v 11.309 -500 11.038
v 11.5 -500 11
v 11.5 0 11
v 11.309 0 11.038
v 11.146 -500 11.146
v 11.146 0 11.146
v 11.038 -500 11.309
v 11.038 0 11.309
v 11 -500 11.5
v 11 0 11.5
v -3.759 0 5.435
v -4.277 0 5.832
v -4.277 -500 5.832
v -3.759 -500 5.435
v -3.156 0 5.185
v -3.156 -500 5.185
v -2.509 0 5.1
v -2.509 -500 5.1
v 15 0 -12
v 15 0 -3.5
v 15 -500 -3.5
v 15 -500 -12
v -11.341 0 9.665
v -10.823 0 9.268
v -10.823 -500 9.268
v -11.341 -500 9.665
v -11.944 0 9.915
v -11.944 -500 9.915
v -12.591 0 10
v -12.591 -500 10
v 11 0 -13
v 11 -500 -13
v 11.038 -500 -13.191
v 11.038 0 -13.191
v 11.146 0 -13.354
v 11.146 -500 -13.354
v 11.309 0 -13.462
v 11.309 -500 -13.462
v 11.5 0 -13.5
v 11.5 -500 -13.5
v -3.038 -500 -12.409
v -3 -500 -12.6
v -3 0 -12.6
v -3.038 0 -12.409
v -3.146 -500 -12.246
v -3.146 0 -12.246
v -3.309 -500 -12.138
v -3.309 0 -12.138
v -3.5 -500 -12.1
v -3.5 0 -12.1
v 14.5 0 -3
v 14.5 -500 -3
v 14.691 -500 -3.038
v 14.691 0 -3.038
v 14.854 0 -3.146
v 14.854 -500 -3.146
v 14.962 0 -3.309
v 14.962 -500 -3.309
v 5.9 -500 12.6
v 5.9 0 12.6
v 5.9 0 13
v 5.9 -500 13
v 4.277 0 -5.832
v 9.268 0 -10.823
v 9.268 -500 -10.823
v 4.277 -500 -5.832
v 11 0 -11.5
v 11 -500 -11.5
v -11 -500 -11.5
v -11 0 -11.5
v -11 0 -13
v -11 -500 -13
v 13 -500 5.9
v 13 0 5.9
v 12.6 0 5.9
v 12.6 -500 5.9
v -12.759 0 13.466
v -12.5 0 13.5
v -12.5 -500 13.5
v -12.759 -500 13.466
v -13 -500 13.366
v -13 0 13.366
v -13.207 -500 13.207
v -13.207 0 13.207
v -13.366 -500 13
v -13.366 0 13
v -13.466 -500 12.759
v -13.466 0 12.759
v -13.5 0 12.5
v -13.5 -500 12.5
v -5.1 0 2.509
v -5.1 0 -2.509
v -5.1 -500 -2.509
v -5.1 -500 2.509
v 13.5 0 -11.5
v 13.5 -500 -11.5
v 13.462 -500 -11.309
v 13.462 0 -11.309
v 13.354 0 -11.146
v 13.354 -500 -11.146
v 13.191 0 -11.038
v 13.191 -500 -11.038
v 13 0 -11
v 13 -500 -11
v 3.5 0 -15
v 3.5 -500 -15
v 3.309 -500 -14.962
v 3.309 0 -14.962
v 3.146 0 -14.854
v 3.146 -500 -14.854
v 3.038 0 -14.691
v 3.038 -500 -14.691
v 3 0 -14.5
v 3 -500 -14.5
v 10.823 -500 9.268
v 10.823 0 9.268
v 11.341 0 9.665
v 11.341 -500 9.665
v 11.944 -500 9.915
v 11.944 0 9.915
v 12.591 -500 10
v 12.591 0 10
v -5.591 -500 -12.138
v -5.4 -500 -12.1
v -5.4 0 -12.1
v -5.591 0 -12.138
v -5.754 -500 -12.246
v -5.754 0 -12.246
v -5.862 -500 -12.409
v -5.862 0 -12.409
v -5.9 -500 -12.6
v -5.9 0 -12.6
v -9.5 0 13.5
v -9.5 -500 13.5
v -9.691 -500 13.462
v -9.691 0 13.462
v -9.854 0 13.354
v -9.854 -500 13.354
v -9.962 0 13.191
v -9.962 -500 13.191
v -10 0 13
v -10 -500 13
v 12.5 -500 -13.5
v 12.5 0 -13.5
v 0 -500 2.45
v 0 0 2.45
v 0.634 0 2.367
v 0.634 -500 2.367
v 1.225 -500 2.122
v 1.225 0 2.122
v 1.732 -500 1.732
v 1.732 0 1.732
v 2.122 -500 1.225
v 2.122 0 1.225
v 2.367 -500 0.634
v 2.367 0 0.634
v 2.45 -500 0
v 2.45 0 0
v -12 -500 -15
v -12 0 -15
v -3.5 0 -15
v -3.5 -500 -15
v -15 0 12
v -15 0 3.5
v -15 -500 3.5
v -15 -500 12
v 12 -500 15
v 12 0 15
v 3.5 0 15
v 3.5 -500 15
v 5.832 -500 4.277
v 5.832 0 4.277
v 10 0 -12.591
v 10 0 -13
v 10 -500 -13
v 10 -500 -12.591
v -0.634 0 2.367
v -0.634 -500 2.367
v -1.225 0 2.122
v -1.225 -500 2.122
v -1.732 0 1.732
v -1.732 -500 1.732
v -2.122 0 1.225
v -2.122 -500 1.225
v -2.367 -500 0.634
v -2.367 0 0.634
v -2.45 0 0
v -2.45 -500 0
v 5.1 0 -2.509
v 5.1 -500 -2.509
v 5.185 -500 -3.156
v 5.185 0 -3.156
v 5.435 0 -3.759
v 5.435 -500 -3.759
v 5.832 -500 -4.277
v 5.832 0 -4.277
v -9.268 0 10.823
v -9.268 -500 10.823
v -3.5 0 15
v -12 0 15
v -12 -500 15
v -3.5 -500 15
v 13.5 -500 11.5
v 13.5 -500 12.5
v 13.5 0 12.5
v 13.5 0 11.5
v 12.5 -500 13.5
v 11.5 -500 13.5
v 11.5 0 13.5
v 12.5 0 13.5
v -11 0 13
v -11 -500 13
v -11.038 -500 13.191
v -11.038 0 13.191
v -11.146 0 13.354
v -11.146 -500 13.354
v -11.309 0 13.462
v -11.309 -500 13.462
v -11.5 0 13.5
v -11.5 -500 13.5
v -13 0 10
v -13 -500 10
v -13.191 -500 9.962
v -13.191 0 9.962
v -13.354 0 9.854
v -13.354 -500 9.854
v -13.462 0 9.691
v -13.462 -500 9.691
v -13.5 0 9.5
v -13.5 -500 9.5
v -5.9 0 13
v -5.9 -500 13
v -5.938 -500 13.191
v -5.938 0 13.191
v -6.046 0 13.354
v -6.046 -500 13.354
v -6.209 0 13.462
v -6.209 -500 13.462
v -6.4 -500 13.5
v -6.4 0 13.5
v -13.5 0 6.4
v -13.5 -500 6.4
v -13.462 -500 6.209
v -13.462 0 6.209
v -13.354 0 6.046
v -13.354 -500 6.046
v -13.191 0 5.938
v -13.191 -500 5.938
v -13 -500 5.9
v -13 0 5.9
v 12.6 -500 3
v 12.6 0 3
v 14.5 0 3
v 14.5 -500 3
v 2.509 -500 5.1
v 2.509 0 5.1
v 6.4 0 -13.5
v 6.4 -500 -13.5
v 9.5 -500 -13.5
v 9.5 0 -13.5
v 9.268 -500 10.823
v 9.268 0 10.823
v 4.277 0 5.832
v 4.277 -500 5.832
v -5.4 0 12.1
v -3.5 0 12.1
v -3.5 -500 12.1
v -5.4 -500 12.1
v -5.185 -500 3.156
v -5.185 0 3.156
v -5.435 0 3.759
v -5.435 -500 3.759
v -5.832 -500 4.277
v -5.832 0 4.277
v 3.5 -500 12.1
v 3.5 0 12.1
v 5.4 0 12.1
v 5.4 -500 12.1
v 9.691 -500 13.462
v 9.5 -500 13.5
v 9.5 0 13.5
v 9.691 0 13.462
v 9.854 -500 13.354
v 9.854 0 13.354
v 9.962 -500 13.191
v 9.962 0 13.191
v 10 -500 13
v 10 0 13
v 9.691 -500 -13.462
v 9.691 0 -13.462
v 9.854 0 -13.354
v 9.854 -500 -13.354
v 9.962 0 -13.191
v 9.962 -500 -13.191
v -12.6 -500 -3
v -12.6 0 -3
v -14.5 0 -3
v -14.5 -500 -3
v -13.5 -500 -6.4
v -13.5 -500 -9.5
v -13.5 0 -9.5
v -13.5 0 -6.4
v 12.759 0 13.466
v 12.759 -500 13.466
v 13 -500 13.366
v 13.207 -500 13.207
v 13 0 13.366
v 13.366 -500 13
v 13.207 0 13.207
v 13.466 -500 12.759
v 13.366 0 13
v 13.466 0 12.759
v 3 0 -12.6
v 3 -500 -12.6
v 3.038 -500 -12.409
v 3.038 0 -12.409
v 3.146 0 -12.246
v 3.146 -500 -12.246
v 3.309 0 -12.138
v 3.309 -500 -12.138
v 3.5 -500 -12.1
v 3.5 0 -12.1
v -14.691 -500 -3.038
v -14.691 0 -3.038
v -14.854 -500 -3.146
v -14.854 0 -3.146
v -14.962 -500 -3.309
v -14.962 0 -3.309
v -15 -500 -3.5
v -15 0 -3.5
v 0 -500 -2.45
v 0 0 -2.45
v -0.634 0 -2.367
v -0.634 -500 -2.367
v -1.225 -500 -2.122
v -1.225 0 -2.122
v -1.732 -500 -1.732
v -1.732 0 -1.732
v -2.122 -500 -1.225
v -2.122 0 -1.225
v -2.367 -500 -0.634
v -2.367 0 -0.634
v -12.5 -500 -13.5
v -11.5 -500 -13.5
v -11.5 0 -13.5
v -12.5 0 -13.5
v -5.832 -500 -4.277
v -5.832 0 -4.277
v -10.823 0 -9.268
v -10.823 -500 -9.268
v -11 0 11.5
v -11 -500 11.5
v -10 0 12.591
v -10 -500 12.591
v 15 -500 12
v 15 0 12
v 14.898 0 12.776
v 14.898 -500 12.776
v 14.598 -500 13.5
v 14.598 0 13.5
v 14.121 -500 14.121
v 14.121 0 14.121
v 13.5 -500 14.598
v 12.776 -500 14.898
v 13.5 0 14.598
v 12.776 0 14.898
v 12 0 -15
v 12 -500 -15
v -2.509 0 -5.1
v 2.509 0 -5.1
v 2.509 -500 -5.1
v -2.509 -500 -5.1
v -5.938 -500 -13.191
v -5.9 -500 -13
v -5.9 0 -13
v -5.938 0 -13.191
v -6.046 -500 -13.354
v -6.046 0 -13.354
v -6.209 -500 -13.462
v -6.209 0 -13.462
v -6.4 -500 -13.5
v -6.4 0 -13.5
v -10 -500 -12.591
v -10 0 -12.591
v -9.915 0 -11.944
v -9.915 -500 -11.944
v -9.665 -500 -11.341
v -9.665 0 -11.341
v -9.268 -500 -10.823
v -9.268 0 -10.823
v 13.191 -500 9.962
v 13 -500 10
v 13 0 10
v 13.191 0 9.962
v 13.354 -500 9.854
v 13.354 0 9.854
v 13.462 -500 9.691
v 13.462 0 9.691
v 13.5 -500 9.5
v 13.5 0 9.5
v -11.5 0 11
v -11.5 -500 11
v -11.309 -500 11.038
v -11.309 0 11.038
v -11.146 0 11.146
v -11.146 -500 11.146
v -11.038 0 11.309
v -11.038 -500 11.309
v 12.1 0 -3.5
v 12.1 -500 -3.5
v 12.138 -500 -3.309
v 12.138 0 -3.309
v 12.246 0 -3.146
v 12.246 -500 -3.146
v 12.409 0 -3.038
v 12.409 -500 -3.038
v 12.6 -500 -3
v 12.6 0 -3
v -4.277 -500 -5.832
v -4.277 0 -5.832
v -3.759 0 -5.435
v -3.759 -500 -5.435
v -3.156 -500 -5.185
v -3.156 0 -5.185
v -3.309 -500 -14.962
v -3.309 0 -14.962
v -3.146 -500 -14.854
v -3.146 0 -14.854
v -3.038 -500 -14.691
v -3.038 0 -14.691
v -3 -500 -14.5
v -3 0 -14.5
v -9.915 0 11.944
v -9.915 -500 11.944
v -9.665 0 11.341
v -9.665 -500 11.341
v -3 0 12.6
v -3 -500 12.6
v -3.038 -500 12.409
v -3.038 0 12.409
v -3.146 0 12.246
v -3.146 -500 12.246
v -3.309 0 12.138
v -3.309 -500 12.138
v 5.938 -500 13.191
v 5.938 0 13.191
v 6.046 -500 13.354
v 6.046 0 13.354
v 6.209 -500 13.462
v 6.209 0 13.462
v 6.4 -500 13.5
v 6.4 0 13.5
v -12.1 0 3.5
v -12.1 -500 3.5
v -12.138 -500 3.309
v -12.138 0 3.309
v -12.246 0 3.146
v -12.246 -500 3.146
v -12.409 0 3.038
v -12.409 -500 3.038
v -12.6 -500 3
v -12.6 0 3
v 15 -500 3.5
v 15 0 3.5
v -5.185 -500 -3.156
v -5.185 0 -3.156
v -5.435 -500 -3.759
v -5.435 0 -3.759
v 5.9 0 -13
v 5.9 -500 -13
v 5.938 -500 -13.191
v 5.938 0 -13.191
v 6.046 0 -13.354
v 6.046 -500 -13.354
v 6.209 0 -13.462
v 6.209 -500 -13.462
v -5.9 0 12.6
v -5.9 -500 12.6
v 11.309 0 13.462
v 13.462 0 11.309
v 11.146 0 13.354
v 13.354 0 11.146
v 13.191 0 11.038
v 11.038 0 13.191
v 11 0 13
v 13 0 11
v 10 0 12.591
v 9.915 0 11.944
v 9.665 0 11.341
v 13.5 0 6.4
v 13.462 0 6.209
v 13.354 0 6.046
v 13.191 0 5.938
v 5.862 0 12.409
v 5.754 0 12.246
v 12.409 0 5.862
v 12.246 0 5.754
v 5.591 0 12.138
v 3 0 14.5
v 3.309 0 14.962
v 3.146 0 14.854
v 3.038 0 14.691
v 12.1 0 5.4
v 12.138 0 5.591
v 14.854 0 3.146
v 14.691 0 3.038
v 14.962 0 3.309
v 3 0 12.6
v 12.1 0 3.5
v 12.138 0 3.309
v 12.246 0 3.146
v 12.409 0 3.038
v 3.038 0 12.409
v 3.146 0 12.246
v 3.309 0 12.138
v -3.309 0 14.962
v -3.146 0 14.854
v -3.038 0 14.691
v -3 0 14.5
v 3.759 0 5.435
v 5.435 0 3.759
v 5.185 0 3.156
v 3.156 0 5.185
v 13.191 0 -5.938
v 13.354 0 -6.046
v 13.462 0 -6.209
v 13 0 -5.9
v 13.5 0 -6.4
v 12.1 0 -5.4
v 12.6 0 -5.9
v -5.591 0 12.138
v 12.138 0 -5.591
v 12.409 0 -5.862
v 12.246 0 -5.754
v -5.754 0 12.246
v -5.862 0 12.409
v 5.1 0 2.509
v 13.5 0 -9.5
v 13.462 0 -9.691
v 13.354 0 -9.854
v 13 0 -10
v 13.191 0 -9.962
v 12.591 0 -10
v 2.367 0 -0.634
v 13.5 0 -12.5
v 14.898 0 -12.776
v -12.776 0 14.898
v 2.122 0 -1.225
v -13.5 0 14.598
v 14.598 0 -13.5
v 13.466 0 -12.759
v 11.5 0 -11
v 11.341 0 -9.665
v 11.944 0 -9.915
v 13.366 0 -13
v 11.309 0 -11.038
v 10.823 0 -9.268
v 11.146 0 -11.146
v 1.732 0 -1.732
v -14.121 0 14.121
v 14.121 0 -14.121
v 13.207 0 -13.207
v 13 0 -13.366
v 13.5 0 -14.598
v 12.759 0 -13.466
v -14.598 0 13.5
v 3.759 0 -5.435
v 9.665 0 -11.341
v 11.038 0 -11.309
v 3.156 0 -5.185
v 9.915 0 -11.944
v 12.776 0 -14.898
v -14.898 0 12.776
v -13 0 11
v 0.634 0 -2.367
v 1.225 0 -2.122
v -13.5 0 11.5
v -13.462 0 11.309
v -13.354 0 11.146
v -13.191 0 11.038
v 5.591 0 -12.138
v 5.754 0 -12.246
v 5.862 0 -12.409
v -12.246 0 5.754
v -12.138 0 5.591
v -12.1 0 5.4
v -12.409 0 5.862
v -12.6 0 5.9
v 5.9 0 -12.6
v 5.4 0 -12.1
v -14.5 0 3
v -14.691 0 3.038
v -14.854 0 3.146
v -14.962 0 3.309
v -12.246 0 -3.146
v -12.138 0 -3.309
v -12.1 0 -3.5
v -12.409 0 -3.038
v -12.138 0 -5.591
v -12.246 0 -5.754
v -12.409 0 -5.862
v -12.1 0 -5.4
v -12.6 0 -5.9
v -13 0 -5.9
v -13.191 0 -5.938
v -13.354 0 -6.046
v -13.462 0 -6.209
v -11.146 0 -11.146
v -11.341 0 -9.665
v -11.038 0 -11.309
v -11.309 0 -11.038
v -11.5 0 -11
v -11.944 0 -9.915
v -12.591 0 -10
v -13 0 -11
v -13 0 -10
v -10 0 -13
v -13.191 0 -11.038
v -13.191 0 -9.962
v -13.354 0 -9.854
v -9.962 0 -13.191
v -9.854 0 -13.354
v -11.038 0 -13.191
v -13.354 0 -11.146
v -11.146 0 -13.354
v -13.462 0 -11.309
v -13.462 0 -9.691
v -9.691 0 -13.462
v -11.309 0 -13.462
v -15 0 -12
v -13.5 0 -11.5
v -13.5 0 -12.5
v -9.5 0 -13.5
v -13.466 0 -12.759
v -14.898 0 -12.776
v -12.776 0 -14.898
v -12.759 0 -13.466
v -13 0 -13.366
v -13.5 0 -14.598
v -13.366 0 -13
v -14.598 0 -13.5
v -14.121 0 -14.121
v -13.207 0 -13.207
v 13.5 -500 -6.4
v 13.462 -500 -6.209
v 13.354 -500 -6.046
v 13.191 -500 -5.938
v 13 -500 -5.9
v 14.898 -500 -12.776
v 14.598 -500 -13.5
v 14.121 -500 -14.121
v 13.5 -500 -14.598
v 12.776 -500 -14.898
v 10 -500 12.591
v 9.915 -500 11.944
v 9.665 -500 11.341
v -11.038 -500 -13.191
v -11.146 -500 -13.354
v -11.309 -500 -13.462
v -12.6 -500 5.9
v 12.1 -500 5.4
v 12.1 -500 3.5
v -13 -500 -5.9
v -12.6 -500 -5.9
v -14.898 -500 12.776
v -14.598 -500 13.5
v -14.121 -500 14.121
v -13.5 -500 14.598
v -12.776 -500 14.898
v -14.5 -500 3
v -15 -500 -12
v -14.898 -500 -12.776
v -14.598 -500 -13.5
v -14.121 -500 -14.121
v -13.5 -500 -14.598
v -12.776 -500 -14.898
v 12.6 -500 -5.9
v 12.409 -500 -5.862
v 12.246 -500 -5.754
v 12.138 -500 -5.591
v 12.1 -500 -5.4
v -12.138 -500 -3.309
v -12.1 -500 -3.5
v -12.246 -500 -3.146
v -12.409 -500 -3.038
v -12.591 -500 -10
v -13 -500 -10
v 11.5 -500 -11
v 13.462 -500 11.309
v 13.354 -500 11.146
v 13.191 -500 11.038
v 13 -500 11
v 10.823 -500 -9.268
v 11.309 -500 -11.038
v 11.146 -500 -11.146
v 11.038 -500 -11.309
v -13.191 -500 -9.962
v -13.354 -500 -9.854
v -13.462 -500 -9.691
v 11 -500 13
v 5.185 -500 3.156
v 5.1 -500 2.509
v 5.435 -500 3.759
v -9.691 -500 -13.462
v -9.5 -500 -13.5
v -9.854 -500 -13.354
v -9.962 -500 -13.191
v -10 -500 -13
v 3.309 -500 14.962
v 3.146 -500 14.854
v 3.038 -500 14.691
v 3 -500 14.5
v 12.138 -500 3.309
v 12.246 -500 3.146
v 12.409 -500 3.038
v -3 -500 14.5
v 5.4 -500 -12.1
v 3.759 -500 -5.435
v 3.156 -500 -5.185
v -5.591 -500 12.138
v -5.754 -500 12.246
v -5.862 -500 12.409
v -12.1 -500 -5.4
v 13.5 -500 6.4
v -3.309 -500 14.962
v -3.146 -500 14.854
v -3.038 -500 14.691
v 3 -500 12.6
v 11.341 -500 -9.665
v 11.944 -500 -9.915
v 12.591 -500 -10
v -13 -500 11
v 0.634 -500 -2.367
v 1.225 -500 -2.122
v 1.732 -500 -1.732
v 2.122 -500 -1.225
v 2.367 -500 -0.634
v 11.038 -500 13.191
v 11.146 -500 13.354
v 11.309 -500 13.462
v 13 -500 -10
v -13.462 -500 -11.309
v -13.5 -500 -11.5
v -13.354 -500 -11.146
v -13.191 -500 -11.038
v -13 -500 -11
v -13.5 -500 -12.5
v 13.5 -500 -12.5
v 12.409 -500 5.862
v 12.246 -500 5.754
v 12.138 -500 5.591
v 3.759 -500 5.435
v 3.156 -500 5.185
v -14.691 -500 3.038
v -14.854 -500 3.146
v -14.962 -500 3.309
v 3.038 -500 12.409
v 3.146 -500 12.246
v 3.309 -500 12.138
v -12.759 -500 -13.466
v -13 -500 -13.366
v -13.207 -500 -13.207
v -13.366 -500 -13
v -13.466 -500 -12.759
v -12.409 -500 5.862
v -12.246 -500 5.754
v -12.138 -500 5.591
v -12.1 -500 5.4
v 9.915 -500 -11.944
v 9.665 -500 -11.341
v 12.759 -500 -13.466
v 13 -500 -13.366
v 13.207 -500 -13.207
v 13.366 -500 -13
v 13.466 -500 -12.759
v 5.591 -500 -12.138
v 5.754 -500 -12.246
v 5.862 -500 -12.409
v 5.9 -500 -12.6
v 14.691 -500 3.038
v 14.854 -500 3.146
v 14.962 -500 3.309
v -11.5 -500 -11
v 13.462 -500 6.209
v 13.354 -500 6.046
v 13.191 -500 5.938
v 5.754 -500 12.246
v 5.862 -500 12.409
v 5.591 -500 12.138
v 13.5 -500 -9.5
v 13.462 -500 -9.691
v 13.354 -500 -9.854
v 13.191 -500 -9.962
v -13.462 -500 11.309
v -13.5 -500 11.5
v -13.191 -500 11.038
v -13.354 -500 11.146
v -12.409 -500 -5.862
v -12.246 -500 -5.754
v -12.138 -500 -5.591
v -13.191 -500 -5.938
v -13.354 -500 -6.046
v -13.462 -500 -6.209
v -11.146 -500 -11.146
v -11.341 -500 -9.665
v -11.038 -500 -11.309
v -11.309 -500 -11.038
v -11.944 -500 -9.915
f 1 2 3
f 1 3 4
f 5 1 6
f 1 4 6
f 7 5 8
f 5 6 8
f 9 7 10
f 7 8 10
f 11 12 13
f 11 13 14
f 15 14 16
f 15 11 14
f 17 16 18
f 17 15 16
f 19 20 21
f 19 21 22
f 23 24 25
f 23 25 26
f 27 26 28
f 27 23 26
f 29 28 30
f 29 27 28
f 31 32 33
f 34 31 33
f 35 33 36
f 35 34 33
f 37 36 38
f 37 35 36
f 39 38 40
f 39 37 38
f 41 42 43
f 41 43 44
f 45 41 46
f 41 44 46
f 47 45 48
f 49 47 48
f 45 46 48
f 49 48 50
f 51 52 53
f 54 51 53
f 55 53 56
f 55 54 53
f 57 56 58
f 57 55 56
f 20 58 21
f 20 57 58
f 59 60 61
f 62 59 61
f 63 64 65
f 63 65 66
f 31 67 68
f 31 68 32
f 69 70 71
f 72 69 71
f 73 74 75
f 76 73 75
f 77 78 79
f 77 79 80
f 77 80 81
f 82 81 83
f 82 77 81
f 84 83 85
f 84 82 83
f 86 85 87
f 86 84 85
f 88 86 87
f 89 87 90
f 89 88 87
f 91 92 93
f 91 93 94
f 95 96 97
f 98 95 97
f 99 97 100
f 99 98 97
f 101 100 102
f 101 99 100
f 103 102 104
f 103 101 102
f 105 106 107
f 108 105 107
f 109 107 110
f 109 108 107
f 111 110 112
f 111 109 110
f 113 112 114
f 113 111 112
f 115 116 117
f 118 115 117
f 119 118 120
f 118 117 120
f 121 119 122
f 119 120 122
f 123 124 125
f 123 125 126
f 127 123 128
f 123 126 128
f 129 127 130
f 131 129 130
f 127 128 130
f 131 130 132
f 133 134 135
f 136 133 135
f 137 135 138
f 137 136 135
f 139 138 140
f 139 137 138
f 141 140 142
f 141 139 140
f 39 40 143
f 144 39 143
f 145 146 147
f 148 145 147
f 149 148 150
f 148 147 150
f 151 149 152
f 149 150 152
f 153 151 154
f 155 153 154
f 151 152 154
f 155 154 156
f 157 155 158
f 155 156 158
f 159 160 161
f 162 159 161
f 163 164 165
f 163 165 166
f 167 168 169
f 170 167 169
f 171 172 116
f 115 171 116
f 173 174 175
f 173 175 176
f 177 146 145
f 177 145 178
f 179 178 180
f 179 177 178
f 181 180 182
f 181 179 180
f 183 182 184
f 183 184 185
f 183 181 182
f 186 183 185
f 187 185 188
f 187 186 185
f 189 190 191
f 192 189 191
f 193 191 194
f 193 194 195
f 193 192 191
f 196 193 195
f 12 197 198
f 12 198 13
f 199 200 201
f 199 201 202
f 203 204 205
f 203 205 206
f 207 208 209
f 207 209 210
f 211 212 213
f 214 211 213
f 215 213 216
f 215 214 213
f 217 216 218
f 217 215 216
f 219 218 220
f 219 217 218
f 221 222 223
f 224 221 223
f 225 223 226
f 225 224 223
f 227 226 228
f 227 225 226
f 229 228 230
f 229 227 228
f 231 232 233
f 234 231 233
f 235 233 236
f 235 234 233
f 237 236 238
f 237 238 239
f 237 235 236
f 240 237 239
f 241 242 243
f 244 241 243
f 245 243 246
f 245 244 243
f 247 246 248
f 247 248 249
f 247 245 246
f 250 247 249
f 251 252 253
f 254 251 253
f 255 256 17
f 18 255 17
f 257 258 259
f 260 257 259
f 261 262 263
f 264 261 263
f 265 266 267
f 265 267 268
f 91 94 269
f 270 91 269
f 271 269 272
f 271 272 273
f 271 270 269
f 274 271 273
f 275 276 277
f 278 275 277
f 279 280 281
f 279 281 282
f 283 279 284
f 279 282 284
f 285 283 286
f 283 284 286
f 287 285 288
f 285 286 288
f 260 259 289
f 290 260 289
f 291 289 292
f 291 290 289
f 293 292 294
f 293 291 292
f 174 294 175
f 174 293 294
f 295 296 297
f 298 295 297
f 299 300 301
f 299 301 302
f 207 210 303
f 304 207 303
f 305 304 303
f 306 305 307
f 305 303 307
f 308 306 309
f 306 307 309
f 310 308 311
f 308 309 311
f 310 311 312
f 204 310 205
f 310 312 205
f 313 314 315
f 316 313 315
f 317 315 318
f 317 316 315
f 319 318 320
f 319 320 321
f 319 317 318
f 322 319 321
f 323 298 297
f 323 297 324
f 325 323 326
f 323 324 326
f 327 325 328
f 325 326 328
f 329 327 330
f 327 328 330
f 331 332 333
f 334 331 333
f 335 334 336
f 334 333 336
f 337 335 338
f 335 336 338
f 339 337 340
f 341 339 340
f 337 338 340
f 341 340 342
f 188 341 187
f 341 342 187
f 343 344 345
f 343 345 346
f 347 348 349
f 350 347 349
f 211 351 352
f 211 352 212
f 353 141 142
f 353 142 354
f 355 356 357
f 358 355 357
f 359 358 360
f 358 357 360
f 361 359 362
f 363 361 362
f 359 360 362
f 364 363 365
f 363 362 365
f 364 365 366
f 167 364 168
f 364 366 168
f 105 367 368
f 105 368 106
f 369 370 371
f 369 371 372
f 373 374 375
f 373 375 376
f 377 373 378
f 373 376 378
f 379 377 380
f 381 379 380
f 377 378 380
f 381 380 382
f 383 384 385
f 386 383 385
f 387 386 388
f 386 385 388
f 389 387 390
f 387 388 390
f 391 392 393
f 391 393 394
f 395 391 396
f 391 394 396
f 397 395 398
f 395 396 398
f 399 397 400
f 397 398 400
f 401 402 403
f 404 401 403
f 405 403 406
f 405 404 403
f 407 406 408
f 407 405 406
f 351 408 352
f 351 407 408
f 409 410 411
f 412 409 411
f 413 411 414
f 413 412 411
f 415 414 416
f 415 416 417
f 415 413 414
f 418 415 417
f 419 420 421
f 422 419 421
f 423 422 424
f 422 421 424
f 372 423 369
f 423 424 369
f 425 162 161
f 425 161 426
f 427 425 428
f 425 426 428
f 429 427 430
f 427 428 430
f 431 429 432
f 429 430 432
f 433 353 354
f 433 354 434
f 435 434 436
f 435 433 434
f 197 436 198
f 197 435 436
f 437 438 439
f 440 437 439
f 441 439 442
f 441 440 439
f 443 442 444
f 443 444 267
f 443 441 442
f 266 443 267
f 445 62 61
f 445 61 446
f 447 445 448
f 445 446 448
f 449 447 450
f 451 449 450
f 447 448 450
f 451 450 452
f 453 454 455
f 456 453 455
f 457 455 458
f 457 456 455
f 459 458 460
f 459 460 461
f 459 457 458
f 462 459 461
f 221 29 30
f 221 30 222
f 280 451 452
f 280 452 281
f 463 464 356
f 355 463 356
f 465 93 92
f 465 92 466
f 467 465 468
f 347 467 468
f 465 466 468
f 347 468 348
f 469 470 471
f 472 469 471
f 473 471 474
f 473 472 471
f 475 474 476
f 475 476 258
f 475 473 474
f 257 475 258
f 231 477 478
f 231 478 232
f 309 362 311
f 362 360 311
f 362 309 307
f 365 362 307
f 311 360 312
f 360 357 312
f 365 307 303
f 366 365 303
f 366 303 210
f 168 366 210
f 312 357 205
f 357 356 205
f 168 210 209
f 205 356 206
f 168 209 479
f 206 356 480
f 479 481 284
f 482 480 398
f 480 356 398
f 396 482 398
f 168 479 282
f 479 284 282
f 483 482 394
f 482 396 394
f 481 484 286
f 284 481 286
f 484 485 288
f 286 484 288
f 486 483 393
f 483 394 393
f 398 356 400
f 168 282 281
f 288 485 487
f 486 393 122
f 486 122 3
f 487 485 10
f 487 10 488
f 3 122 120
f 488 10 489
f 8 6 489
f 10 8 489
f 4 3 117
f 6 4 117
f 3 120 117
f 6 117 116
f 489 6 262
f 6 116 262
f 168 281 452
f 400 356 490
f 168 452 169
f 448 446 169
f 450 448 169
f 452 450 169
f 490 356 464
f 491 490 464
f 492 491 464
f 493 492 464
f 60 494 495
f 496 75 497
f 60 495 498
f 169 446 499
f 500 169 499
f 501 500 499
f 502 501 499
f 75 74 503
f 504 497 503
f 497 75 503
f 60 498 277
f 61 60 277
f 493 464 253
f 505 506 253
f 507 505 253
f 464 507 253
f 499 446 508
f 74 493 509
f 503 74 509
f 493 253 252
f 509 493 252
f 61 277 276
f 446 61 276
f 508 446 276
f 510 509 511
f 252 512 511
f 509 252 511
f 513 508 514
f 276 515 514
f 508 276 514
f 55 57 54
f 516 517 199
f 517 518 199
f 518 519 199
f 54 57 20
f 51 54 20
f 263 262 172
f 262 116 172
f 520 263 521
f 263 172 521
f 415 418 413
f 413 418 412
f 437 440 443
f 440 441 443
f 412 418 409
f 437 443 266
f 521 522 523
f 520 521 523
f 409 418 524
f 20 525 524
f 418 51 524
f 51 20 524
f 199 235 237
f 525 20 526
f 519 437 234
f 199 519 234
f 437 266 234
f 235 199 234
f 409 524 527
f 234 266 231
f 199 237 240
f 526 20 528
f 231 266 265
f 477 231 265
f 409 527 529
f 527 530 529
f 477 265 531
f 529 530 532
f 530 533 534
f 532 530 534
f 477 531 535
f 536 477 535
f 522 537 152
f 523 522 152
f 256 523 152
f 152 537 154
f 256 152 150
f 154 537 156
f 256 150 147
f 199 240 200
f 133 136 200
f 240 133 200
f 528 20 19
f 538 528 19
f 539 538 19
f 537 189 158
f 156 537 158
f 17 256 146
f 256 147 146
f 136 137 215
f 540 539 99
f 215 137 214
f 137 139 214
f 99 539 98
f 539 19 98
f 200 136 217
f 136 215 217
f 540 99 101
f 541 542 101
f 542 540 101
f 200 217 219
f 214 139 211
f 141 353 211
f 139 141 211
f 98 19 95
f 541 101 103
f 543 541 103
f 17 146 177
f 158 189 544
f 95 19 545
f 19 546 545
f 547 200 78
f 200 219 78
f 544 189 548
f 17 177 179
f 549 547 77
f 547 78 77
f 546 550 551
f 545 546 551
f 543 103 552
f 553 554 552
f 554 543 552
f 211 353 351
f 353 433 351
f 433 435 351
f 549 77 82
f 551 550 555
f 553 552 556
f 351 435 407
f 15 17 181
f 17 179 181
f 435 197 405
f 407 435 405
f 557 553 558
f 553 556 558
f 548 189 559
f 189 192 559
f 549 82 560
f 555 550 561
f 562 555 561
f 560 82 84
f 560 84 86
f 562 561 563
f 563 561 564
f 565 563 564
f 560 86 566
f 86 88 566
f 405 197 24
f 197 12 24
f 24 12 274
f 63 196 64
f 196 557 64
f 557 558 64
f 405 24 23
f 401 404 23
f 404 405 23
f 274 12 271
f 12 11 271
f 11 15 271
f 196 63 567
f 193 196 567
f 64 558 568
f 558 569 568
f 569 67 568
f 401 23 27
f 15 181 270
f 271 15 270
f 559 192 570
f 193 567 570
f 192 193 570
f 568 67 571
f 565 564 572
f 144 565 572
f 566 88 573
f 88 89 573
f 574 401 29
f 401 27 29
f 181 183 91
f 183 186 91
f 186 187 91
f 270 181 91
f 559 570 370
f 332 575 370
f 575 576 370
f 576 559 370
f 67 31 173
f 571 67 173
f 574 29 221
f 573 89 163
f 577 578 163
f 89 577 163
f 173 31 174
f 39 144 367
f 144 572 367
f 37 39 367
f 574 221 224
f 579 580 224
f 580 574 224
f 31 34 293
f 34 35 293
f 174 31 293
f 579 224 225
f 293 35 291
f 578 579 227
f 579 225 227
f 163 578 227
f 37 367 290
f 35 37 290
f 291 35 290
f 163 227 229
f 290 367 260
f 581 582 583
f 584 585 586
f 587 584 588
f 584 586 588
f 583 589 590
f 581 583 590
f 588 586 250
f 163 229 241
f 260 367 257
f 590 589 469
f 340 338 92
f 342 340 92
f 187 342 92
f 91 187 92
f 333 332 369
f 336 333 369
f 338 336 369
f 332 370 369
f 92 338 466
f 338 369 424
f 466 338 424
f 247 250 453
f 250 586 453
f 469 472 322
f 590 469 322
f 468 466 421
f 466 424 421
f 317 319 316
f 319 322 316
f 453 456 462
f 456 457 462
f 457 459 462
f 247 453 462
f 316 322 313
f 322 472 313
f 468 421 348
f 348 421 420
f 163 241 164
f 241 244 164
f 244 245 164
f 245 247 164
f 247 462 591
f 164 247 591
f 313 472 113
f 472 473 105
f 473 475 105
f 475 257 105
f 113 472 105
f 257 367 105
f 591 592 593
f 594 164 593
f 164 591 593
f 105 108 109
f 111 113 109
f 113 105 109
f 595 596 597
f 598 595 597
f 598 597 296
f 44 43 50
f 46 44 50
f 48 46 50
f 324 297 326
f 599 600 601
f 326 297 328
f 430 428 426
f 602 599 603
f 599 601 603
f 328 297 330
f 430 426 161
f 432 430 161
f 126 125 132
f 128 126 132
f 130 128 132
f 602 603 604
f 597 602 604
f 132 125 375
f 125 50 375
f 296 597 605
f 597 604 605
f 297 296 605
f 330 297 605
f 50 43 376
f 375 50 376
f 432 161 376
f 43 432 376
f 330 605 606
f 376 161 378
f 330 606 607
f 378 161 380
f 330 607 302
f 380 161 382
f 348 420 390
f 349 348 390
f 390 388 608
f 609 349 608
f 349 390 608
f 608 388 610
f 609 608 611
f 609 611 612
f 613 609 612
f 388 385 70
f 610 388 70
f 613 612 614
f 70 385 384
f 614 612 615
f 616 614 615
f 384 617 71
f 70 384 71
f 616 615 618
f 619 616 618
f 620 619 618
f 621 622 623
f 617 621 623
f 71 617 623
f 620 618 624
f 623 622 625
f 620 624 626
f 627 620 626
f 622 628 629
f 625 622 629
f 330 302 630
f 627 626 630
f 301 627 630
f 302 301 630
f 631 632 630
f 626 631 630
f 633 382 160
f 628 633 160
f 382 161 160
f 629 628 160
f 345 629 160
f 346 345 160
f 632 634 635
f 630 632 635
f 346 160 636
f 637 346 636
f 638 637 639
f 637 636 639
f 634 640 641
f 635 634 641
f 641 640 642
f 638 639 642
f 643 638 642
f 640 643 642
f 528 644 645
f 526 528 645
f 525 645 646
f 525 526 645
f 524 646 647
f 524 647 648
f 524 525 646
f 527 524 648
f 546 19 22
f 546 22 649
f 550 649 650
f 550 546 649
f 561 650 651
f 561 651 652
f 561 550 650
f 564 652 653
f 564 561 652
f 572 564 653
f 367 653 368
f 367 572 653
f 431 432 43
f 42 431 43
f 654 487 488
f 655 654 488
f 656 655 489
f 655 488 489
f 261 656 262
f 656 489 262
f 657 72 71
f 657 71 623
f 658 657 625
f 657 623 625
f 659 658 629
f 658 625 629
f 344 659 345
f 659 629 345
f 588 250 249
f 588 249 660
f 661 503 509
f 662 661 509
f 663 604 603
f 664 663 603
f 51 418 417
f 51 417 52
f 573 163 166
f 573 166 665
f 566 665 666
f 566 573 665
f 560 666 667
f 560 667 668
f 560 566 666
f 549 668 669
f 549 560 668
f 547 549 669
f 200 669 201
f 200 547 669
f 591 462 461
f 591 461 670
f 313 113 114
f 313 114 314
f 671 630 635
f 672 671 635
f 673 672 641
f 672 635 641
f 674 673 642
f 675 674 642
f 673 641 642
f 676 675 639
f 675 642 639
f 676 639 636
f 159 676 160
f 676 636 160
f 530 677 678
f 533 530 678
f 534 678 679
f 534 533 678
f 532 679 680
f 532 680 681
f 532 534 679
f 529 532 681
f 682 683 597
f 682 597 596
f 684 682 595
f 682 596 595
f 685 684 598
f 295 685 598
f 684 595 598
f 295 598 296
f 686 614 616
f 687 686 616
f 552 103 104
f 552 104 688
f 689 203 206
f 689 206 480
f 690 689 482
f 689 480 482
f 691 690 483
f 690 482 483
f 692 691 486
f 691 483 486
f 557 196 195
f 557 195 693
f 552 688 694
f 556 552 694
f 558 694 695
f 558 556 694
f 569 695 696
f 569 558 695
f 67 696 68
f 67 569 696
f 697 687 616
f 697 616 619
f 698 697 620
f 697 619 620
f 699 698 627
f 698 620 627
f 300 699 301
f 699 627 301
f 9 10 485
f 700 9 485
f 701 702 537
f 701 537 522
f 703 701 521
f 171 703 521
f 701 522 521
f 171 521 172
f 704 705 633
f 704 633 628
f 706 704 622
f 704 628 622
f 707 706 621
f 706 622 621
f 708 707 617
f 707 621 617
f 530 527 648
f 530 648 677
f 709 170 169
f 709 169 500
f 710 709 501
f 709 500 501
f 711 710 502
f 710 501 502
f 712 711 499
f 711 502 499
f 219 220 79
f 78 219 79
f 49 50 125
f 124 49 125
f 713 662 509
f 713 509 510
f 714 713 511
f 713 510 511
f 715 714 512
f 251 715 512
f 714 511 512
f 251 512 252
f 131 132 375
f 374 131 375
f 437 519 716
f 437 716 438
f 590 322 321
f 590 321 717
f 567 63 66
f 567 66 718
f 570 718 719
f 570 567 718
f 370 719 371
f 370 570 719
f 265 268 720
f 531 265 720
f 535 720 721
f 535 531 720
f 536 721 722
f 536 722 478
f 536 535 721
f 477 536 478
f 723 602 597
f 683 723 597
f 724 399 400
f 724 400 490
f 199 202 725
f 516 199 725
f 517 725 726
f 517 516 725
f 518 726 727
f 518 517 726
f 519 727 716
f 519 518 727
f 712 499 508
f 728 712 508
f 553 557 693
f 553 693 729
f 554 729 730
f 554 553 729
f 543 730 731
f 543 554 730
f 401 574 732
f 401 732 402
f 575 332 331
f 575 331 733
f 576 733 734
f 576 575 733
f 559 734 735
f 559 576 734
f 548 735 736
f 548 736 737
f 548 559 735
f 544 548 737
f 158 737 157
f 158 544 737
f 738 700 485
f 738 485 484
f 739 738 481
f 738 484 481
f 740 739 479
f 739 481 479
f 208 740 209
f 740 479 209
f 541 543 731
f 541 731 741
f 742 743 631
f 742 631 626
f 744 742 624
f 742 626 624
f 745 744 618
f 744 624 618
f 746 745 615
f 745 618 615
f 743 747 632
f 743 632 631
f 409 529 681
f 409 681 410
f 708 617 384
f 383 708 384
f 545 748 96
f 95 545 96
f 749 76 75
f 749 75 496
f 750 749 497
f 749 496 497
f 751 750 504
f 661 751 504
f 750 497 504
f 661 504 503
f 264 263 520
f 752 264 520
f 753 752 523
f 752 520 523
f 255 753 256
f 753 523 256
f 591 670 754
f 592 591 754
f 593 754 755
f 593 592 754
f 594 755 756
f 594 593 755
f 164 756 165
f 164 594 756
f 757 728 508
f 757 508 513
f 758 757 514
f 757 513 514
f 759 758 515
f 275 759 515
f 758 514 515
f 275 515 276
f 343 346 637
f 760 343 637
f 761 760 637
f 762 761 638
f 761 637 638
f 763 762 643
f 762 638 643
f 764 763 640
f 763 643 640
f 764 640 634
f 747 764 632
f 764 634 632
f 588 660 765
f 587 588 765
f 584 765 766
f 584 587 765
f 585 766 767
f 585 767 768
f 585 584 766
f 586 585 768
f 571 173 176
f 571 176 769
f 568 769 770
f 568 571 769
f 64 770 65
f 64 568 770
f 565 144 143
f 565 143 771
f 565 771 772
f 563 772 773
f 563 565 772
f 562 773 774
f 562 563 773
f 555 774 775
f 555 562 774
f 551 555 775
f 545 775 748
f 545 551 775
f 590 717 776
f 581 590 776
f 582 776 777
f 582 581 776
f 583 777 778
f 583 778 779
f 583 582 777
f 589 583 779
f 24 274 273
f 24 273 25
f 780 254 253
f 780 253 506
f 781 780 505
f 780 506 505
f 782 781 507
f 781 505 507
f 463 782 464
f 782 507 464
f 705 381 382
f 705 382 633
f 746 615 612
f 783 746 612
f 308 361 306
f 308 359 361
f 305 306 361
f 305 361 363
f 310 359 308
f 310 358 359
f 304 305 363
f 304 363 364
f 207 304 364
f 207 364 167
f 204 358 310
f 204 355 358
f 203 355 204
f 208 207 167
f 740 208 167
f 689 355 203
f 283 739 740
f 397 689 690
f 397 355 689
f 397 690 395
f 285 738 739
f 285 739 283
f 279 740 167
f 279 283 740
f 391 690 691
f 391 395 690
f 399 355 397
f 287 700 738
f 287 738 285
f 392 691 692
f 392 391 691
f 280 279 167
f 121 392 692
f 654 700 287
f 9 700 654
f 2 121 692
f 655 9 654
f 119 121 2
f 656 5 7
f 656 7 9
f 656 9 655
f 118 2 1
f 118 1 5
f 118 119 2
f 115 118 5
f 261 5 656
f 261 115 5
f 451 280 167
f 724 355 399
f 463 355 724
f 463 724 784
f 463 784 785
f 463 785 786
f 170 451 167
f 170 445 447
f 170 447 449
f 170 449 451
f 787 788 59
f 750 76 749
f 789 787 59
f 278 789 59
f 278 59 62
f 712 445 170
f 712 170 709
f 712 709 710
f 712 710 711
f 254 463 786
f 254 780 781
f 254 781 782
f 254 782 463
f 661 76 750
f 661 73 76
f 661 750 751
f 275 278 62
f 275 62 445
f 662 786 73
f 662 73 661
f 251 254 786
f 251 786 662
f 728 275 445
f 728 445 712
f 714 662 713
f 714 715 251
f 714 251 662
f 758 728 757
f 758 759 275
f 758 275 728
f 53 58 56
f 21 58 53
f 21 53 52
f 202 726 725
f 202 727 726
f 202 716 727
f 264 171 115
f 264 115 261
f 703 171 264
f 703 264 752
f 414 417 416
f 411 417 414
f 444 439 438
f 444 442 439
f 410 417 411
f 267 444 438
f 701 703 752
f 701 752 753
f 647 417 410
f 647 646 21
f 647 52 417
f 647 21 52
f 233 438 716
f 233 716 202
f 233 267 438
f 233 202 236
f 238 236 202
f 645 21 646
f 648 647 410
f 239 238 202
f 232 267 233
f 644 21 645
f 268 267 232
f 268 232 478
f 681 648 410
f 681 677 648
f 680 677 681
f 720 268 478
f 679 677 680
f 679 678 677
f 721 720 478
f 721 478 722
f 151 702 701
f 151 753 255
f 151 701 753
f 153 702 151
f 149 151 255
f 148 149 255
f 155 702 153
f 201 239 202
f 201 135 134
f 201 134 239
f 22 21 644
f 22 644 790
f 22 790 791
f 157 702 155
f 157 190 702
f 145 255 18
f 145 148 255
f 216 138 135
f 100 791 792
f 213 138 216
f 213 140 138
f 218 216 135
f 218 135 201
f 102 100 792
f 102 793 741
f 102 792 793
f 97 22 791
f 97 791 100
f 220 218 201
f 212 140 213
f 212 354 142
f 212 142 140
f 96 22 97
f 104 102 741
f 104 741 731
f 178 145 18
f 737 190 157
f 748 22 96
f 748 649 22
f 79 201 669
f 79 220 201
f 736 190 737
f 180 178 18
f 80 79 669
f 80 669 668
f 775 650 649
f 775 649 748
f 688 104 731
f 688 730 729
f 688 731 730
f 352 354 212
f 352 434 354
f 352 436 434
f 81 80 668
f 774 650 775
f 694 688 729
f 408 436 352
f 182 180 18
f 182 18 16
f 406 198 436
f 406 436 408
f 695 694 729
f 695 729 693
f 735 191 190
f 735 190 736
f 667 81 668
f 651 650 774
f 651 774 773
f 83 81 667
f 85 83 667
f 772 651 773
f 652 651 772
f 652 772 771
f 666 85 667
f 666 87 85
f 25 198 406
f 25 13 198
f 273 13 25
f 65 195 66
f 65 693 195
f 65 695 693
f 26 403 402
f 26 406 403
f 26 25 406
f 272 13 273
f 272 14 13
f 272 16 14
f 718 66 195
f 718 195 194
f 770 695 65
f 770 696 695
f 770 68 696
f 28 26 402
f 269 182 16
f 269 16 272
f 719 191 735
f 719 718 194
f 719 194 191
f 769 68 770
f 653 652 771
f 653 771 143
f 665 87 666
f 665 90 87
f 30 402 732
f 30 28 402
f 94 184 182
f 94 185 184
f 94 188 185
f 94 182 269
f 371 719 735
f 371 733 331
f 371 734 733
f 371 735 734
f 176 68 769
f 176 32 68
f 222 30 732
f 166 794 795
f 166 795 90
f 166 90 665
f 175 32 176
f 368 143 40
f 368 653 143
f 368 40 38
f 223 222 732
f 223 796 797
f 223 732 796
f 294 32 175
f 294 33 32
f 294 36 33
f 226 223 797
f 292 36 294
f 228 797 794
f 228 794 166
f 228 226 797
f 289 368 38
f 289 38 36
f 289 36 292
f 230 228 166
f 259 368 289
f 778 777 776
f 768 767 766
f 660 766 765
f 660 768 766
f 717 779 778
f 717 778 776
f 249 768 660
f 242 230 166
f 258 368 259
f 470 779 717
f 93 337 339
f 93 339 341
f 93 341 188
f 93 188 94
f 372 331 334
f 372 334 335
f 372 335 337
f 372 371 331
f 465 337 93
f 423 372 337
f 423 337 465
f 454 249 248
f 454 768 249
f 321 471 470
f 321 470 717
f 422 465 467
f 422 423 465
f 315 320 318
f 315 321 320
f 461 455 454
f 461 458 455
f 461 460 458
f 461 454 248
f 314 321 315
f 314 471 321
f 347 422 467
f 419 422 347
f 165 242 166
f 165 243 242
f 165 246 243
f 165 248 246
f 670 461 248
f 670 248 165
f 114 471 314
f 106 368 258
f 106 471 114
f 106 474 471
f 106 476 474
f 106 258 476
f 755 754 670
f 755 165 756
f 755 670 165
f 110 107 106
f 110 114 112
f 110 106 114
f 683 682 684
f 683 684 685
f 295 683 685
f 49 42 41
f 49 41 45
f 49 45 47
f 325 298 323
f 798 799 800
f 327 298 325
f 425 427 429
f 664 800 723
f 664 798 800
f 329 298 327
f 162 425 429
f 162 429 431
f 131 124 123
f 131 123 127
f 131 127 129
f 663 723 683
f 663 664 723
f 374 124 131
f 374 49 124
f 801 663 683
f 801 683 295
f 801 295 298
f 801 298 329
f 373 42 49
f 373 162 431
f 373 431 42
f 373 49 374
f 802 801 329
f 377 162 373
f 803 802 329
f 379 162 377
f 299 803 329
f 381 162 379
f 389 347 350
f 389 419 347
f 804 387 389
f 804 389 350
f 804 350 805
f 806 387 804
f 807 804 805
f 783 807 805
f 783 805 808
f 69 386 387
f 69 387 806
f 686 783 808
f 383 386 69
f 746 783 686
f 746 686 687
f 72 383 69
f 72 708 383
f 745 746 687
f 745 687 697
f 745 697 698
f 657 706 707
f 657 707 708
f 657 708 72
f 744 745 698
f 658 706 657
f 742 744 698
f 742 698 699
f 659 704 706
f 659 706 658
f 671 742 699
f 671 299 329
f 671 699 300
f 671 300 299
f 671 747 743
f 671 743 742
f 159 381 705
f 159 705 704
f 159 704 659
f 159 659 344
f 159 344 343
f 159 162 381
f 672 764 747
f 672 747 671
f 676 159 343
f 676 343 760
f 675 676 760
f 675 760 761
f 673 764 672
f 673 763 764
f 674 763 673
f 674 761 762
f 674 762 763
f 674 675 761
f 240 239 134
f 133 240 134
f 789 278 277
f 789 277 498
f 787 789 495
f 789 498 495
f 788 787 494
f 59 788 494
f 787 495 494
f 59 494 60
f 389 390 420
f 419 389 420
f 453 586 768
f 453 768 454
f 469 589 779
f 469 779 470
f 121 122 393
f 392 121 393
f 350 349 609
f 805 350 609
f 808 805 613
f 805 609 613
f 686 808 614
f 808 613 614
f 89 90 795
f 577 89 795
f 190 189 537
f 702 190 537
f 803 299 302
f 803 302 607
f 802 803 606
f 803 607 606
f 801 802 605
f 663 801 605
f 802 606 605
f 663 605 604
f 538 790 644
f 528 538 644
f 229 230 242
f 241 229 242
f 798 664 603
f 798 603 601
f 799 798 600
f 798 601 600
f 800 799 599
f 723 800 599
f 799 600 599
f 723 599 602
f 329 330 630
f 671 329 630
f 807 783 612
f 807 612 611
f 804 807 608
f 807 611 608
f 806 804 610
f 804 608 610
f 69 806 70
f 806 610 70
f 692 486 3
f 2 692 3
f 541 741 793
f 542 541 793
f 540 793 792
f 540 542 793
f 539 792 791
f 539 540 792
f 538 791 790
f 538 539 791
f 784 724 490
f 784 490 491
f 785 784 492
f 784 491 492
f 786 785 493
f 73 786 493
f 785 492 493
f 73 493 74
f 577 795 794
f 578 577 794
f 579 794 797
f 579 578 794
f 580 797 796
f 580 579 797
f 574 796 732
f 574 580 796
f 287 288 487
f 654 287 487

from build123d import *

# Parameters (mm, degrees)
F1_DEPTH = 500


with BuildPart() as f1:
    # F0 (on Front) → F1 (new body)
    with BuildSketch(Plane.XZ):
        with BuildLine():
            ThreePointArc((0, -2.45), (-1.732412, -1.732412), (-2.45, 0))
            Line((-2.45, 0), (-5.1, 0))
            Line((-5.1, 0), (-5.1, -2.508831))
            ThreePointArc((-5.1, -2.508831), (-5.290301, -3.46554), (-5.832233, -4.276598))
            Line((-5.832233, -4.276598), (-10.823402, -9.267767))
            ThreePointArc((-10.823402, -9.267767), (-11.63446, -9.809699), (-12.591169, -10))
            Line((-12.591169, -10), (-13, -10))
            ThreePointArc((-13, -10), (-13.353553, -9.853553), (-13.5, -9.5))
            Line((-13.5, -9.5), (-13.5, -6.4))
            ThreePointArc((-13.5, -6.4), (-13.353553, -6.046447), (-13, -5.9))
            Line((-13, -5.9), (-12.6, -5.9))
            ThreePointArc((-12.6, -5.9), (-12.246447, -5.753553), (-12.1, -5.4))
            Line((-12.1, -5.4), (-12.1, -3.5))
            ThreePointArc((-12.1, -3.5), (-12.246447, -3.146447), (-12.6, -3))
            Line((-12.6, -3), (-14.5, -3))
            ThreePointArc((-14.5, -3), (-14.853553, -3.146447), (-15, -3.5))
            Line((-15, -3.5), (-15, -12))
            ThreePointArc((-15, -12), (-14.12132, -14.12132), (-12, -15))
            Line((-12, -15), (-3.5, -15))
            ThreePointArc((-3.5, -15), (-3.146447, -14.853553), (-3, -14.5))
            Line((-3, -14.5), (-3, -12.6))
            ThreePointArc((-3, -12.6), (-3.146447, -12.246447), (-3.5, -12.1))
            Line((-3.5, -12.1), (-5.4, -12.1))
            ThreePointArc((-5.4, -12.1), (-5.753553, -12.246447), (-5.9, -12.6))
            Line((-5.9, -12.6), (-5.9, -13))
            ThreePointArc((-5.9, -13), (-6.046447, -13.353553), (-6.4, -13.5))
            Line((-6.4, -13.5), (-9.5, -13.5))
            ThreePointArc((-9.5, -13.5), (-9.853553, -13.353553), (-10, -13))
            Line((-10, -13), (-10, -12.591169))
            ThreePointArc((-10, -12.591169), (-9.809699, -11.63446), (-9.267767, -10.823402))
            Line((-9.267767, -10.823402), (-4.276598, -5.832233))
            ThreePointArc((-4.276598, -5.832233), (-3.46554, -5.290301), (-2.508831, -5.1))
            Line((-2.508831, -5.1), (0, -5.1))
            Line((0, -5.1), (0, -2.45))
        make_face()
        with BuildLine():
            Line((-11.5, -13.5), (-12.5, -13.5))
            ThreePointArc((-12.5, -13.5), (-13.207107, -13.207107), (-13.5, -12.5))
            Line((-13.5, -12.5), (-13.5, -11.5))
            ThreePointArc((-13.5, -11.5), (-13.353553, -11.146447), (-13, -11))
            Line((-13, -11), (-11.5, -11))
            ThreePointArc((-11.5, -11), (-11.146447, -11.146447), (-11, -11.5))
            Line((-11, -11.5), (-11, -13))
            ThreePointArc((-11, -13), (-11.146447, -13.353553), (-11.5, -13.5))
        make_face(mode=Mode.SUBTRACT)
    extrude(amount=F1_DEPTH)

    # F2: F1 across plane


with BuildPart() as f1_1:
    add(f1.part)
    add(f1.part.mirror(Plane.YZ))

    # F3: F1 across plane


with BuildPart() as f1_2:
    add(f1_1.part)
    add(f1_1.part.mirror(Plane.XY))


solid = f1_2.part
